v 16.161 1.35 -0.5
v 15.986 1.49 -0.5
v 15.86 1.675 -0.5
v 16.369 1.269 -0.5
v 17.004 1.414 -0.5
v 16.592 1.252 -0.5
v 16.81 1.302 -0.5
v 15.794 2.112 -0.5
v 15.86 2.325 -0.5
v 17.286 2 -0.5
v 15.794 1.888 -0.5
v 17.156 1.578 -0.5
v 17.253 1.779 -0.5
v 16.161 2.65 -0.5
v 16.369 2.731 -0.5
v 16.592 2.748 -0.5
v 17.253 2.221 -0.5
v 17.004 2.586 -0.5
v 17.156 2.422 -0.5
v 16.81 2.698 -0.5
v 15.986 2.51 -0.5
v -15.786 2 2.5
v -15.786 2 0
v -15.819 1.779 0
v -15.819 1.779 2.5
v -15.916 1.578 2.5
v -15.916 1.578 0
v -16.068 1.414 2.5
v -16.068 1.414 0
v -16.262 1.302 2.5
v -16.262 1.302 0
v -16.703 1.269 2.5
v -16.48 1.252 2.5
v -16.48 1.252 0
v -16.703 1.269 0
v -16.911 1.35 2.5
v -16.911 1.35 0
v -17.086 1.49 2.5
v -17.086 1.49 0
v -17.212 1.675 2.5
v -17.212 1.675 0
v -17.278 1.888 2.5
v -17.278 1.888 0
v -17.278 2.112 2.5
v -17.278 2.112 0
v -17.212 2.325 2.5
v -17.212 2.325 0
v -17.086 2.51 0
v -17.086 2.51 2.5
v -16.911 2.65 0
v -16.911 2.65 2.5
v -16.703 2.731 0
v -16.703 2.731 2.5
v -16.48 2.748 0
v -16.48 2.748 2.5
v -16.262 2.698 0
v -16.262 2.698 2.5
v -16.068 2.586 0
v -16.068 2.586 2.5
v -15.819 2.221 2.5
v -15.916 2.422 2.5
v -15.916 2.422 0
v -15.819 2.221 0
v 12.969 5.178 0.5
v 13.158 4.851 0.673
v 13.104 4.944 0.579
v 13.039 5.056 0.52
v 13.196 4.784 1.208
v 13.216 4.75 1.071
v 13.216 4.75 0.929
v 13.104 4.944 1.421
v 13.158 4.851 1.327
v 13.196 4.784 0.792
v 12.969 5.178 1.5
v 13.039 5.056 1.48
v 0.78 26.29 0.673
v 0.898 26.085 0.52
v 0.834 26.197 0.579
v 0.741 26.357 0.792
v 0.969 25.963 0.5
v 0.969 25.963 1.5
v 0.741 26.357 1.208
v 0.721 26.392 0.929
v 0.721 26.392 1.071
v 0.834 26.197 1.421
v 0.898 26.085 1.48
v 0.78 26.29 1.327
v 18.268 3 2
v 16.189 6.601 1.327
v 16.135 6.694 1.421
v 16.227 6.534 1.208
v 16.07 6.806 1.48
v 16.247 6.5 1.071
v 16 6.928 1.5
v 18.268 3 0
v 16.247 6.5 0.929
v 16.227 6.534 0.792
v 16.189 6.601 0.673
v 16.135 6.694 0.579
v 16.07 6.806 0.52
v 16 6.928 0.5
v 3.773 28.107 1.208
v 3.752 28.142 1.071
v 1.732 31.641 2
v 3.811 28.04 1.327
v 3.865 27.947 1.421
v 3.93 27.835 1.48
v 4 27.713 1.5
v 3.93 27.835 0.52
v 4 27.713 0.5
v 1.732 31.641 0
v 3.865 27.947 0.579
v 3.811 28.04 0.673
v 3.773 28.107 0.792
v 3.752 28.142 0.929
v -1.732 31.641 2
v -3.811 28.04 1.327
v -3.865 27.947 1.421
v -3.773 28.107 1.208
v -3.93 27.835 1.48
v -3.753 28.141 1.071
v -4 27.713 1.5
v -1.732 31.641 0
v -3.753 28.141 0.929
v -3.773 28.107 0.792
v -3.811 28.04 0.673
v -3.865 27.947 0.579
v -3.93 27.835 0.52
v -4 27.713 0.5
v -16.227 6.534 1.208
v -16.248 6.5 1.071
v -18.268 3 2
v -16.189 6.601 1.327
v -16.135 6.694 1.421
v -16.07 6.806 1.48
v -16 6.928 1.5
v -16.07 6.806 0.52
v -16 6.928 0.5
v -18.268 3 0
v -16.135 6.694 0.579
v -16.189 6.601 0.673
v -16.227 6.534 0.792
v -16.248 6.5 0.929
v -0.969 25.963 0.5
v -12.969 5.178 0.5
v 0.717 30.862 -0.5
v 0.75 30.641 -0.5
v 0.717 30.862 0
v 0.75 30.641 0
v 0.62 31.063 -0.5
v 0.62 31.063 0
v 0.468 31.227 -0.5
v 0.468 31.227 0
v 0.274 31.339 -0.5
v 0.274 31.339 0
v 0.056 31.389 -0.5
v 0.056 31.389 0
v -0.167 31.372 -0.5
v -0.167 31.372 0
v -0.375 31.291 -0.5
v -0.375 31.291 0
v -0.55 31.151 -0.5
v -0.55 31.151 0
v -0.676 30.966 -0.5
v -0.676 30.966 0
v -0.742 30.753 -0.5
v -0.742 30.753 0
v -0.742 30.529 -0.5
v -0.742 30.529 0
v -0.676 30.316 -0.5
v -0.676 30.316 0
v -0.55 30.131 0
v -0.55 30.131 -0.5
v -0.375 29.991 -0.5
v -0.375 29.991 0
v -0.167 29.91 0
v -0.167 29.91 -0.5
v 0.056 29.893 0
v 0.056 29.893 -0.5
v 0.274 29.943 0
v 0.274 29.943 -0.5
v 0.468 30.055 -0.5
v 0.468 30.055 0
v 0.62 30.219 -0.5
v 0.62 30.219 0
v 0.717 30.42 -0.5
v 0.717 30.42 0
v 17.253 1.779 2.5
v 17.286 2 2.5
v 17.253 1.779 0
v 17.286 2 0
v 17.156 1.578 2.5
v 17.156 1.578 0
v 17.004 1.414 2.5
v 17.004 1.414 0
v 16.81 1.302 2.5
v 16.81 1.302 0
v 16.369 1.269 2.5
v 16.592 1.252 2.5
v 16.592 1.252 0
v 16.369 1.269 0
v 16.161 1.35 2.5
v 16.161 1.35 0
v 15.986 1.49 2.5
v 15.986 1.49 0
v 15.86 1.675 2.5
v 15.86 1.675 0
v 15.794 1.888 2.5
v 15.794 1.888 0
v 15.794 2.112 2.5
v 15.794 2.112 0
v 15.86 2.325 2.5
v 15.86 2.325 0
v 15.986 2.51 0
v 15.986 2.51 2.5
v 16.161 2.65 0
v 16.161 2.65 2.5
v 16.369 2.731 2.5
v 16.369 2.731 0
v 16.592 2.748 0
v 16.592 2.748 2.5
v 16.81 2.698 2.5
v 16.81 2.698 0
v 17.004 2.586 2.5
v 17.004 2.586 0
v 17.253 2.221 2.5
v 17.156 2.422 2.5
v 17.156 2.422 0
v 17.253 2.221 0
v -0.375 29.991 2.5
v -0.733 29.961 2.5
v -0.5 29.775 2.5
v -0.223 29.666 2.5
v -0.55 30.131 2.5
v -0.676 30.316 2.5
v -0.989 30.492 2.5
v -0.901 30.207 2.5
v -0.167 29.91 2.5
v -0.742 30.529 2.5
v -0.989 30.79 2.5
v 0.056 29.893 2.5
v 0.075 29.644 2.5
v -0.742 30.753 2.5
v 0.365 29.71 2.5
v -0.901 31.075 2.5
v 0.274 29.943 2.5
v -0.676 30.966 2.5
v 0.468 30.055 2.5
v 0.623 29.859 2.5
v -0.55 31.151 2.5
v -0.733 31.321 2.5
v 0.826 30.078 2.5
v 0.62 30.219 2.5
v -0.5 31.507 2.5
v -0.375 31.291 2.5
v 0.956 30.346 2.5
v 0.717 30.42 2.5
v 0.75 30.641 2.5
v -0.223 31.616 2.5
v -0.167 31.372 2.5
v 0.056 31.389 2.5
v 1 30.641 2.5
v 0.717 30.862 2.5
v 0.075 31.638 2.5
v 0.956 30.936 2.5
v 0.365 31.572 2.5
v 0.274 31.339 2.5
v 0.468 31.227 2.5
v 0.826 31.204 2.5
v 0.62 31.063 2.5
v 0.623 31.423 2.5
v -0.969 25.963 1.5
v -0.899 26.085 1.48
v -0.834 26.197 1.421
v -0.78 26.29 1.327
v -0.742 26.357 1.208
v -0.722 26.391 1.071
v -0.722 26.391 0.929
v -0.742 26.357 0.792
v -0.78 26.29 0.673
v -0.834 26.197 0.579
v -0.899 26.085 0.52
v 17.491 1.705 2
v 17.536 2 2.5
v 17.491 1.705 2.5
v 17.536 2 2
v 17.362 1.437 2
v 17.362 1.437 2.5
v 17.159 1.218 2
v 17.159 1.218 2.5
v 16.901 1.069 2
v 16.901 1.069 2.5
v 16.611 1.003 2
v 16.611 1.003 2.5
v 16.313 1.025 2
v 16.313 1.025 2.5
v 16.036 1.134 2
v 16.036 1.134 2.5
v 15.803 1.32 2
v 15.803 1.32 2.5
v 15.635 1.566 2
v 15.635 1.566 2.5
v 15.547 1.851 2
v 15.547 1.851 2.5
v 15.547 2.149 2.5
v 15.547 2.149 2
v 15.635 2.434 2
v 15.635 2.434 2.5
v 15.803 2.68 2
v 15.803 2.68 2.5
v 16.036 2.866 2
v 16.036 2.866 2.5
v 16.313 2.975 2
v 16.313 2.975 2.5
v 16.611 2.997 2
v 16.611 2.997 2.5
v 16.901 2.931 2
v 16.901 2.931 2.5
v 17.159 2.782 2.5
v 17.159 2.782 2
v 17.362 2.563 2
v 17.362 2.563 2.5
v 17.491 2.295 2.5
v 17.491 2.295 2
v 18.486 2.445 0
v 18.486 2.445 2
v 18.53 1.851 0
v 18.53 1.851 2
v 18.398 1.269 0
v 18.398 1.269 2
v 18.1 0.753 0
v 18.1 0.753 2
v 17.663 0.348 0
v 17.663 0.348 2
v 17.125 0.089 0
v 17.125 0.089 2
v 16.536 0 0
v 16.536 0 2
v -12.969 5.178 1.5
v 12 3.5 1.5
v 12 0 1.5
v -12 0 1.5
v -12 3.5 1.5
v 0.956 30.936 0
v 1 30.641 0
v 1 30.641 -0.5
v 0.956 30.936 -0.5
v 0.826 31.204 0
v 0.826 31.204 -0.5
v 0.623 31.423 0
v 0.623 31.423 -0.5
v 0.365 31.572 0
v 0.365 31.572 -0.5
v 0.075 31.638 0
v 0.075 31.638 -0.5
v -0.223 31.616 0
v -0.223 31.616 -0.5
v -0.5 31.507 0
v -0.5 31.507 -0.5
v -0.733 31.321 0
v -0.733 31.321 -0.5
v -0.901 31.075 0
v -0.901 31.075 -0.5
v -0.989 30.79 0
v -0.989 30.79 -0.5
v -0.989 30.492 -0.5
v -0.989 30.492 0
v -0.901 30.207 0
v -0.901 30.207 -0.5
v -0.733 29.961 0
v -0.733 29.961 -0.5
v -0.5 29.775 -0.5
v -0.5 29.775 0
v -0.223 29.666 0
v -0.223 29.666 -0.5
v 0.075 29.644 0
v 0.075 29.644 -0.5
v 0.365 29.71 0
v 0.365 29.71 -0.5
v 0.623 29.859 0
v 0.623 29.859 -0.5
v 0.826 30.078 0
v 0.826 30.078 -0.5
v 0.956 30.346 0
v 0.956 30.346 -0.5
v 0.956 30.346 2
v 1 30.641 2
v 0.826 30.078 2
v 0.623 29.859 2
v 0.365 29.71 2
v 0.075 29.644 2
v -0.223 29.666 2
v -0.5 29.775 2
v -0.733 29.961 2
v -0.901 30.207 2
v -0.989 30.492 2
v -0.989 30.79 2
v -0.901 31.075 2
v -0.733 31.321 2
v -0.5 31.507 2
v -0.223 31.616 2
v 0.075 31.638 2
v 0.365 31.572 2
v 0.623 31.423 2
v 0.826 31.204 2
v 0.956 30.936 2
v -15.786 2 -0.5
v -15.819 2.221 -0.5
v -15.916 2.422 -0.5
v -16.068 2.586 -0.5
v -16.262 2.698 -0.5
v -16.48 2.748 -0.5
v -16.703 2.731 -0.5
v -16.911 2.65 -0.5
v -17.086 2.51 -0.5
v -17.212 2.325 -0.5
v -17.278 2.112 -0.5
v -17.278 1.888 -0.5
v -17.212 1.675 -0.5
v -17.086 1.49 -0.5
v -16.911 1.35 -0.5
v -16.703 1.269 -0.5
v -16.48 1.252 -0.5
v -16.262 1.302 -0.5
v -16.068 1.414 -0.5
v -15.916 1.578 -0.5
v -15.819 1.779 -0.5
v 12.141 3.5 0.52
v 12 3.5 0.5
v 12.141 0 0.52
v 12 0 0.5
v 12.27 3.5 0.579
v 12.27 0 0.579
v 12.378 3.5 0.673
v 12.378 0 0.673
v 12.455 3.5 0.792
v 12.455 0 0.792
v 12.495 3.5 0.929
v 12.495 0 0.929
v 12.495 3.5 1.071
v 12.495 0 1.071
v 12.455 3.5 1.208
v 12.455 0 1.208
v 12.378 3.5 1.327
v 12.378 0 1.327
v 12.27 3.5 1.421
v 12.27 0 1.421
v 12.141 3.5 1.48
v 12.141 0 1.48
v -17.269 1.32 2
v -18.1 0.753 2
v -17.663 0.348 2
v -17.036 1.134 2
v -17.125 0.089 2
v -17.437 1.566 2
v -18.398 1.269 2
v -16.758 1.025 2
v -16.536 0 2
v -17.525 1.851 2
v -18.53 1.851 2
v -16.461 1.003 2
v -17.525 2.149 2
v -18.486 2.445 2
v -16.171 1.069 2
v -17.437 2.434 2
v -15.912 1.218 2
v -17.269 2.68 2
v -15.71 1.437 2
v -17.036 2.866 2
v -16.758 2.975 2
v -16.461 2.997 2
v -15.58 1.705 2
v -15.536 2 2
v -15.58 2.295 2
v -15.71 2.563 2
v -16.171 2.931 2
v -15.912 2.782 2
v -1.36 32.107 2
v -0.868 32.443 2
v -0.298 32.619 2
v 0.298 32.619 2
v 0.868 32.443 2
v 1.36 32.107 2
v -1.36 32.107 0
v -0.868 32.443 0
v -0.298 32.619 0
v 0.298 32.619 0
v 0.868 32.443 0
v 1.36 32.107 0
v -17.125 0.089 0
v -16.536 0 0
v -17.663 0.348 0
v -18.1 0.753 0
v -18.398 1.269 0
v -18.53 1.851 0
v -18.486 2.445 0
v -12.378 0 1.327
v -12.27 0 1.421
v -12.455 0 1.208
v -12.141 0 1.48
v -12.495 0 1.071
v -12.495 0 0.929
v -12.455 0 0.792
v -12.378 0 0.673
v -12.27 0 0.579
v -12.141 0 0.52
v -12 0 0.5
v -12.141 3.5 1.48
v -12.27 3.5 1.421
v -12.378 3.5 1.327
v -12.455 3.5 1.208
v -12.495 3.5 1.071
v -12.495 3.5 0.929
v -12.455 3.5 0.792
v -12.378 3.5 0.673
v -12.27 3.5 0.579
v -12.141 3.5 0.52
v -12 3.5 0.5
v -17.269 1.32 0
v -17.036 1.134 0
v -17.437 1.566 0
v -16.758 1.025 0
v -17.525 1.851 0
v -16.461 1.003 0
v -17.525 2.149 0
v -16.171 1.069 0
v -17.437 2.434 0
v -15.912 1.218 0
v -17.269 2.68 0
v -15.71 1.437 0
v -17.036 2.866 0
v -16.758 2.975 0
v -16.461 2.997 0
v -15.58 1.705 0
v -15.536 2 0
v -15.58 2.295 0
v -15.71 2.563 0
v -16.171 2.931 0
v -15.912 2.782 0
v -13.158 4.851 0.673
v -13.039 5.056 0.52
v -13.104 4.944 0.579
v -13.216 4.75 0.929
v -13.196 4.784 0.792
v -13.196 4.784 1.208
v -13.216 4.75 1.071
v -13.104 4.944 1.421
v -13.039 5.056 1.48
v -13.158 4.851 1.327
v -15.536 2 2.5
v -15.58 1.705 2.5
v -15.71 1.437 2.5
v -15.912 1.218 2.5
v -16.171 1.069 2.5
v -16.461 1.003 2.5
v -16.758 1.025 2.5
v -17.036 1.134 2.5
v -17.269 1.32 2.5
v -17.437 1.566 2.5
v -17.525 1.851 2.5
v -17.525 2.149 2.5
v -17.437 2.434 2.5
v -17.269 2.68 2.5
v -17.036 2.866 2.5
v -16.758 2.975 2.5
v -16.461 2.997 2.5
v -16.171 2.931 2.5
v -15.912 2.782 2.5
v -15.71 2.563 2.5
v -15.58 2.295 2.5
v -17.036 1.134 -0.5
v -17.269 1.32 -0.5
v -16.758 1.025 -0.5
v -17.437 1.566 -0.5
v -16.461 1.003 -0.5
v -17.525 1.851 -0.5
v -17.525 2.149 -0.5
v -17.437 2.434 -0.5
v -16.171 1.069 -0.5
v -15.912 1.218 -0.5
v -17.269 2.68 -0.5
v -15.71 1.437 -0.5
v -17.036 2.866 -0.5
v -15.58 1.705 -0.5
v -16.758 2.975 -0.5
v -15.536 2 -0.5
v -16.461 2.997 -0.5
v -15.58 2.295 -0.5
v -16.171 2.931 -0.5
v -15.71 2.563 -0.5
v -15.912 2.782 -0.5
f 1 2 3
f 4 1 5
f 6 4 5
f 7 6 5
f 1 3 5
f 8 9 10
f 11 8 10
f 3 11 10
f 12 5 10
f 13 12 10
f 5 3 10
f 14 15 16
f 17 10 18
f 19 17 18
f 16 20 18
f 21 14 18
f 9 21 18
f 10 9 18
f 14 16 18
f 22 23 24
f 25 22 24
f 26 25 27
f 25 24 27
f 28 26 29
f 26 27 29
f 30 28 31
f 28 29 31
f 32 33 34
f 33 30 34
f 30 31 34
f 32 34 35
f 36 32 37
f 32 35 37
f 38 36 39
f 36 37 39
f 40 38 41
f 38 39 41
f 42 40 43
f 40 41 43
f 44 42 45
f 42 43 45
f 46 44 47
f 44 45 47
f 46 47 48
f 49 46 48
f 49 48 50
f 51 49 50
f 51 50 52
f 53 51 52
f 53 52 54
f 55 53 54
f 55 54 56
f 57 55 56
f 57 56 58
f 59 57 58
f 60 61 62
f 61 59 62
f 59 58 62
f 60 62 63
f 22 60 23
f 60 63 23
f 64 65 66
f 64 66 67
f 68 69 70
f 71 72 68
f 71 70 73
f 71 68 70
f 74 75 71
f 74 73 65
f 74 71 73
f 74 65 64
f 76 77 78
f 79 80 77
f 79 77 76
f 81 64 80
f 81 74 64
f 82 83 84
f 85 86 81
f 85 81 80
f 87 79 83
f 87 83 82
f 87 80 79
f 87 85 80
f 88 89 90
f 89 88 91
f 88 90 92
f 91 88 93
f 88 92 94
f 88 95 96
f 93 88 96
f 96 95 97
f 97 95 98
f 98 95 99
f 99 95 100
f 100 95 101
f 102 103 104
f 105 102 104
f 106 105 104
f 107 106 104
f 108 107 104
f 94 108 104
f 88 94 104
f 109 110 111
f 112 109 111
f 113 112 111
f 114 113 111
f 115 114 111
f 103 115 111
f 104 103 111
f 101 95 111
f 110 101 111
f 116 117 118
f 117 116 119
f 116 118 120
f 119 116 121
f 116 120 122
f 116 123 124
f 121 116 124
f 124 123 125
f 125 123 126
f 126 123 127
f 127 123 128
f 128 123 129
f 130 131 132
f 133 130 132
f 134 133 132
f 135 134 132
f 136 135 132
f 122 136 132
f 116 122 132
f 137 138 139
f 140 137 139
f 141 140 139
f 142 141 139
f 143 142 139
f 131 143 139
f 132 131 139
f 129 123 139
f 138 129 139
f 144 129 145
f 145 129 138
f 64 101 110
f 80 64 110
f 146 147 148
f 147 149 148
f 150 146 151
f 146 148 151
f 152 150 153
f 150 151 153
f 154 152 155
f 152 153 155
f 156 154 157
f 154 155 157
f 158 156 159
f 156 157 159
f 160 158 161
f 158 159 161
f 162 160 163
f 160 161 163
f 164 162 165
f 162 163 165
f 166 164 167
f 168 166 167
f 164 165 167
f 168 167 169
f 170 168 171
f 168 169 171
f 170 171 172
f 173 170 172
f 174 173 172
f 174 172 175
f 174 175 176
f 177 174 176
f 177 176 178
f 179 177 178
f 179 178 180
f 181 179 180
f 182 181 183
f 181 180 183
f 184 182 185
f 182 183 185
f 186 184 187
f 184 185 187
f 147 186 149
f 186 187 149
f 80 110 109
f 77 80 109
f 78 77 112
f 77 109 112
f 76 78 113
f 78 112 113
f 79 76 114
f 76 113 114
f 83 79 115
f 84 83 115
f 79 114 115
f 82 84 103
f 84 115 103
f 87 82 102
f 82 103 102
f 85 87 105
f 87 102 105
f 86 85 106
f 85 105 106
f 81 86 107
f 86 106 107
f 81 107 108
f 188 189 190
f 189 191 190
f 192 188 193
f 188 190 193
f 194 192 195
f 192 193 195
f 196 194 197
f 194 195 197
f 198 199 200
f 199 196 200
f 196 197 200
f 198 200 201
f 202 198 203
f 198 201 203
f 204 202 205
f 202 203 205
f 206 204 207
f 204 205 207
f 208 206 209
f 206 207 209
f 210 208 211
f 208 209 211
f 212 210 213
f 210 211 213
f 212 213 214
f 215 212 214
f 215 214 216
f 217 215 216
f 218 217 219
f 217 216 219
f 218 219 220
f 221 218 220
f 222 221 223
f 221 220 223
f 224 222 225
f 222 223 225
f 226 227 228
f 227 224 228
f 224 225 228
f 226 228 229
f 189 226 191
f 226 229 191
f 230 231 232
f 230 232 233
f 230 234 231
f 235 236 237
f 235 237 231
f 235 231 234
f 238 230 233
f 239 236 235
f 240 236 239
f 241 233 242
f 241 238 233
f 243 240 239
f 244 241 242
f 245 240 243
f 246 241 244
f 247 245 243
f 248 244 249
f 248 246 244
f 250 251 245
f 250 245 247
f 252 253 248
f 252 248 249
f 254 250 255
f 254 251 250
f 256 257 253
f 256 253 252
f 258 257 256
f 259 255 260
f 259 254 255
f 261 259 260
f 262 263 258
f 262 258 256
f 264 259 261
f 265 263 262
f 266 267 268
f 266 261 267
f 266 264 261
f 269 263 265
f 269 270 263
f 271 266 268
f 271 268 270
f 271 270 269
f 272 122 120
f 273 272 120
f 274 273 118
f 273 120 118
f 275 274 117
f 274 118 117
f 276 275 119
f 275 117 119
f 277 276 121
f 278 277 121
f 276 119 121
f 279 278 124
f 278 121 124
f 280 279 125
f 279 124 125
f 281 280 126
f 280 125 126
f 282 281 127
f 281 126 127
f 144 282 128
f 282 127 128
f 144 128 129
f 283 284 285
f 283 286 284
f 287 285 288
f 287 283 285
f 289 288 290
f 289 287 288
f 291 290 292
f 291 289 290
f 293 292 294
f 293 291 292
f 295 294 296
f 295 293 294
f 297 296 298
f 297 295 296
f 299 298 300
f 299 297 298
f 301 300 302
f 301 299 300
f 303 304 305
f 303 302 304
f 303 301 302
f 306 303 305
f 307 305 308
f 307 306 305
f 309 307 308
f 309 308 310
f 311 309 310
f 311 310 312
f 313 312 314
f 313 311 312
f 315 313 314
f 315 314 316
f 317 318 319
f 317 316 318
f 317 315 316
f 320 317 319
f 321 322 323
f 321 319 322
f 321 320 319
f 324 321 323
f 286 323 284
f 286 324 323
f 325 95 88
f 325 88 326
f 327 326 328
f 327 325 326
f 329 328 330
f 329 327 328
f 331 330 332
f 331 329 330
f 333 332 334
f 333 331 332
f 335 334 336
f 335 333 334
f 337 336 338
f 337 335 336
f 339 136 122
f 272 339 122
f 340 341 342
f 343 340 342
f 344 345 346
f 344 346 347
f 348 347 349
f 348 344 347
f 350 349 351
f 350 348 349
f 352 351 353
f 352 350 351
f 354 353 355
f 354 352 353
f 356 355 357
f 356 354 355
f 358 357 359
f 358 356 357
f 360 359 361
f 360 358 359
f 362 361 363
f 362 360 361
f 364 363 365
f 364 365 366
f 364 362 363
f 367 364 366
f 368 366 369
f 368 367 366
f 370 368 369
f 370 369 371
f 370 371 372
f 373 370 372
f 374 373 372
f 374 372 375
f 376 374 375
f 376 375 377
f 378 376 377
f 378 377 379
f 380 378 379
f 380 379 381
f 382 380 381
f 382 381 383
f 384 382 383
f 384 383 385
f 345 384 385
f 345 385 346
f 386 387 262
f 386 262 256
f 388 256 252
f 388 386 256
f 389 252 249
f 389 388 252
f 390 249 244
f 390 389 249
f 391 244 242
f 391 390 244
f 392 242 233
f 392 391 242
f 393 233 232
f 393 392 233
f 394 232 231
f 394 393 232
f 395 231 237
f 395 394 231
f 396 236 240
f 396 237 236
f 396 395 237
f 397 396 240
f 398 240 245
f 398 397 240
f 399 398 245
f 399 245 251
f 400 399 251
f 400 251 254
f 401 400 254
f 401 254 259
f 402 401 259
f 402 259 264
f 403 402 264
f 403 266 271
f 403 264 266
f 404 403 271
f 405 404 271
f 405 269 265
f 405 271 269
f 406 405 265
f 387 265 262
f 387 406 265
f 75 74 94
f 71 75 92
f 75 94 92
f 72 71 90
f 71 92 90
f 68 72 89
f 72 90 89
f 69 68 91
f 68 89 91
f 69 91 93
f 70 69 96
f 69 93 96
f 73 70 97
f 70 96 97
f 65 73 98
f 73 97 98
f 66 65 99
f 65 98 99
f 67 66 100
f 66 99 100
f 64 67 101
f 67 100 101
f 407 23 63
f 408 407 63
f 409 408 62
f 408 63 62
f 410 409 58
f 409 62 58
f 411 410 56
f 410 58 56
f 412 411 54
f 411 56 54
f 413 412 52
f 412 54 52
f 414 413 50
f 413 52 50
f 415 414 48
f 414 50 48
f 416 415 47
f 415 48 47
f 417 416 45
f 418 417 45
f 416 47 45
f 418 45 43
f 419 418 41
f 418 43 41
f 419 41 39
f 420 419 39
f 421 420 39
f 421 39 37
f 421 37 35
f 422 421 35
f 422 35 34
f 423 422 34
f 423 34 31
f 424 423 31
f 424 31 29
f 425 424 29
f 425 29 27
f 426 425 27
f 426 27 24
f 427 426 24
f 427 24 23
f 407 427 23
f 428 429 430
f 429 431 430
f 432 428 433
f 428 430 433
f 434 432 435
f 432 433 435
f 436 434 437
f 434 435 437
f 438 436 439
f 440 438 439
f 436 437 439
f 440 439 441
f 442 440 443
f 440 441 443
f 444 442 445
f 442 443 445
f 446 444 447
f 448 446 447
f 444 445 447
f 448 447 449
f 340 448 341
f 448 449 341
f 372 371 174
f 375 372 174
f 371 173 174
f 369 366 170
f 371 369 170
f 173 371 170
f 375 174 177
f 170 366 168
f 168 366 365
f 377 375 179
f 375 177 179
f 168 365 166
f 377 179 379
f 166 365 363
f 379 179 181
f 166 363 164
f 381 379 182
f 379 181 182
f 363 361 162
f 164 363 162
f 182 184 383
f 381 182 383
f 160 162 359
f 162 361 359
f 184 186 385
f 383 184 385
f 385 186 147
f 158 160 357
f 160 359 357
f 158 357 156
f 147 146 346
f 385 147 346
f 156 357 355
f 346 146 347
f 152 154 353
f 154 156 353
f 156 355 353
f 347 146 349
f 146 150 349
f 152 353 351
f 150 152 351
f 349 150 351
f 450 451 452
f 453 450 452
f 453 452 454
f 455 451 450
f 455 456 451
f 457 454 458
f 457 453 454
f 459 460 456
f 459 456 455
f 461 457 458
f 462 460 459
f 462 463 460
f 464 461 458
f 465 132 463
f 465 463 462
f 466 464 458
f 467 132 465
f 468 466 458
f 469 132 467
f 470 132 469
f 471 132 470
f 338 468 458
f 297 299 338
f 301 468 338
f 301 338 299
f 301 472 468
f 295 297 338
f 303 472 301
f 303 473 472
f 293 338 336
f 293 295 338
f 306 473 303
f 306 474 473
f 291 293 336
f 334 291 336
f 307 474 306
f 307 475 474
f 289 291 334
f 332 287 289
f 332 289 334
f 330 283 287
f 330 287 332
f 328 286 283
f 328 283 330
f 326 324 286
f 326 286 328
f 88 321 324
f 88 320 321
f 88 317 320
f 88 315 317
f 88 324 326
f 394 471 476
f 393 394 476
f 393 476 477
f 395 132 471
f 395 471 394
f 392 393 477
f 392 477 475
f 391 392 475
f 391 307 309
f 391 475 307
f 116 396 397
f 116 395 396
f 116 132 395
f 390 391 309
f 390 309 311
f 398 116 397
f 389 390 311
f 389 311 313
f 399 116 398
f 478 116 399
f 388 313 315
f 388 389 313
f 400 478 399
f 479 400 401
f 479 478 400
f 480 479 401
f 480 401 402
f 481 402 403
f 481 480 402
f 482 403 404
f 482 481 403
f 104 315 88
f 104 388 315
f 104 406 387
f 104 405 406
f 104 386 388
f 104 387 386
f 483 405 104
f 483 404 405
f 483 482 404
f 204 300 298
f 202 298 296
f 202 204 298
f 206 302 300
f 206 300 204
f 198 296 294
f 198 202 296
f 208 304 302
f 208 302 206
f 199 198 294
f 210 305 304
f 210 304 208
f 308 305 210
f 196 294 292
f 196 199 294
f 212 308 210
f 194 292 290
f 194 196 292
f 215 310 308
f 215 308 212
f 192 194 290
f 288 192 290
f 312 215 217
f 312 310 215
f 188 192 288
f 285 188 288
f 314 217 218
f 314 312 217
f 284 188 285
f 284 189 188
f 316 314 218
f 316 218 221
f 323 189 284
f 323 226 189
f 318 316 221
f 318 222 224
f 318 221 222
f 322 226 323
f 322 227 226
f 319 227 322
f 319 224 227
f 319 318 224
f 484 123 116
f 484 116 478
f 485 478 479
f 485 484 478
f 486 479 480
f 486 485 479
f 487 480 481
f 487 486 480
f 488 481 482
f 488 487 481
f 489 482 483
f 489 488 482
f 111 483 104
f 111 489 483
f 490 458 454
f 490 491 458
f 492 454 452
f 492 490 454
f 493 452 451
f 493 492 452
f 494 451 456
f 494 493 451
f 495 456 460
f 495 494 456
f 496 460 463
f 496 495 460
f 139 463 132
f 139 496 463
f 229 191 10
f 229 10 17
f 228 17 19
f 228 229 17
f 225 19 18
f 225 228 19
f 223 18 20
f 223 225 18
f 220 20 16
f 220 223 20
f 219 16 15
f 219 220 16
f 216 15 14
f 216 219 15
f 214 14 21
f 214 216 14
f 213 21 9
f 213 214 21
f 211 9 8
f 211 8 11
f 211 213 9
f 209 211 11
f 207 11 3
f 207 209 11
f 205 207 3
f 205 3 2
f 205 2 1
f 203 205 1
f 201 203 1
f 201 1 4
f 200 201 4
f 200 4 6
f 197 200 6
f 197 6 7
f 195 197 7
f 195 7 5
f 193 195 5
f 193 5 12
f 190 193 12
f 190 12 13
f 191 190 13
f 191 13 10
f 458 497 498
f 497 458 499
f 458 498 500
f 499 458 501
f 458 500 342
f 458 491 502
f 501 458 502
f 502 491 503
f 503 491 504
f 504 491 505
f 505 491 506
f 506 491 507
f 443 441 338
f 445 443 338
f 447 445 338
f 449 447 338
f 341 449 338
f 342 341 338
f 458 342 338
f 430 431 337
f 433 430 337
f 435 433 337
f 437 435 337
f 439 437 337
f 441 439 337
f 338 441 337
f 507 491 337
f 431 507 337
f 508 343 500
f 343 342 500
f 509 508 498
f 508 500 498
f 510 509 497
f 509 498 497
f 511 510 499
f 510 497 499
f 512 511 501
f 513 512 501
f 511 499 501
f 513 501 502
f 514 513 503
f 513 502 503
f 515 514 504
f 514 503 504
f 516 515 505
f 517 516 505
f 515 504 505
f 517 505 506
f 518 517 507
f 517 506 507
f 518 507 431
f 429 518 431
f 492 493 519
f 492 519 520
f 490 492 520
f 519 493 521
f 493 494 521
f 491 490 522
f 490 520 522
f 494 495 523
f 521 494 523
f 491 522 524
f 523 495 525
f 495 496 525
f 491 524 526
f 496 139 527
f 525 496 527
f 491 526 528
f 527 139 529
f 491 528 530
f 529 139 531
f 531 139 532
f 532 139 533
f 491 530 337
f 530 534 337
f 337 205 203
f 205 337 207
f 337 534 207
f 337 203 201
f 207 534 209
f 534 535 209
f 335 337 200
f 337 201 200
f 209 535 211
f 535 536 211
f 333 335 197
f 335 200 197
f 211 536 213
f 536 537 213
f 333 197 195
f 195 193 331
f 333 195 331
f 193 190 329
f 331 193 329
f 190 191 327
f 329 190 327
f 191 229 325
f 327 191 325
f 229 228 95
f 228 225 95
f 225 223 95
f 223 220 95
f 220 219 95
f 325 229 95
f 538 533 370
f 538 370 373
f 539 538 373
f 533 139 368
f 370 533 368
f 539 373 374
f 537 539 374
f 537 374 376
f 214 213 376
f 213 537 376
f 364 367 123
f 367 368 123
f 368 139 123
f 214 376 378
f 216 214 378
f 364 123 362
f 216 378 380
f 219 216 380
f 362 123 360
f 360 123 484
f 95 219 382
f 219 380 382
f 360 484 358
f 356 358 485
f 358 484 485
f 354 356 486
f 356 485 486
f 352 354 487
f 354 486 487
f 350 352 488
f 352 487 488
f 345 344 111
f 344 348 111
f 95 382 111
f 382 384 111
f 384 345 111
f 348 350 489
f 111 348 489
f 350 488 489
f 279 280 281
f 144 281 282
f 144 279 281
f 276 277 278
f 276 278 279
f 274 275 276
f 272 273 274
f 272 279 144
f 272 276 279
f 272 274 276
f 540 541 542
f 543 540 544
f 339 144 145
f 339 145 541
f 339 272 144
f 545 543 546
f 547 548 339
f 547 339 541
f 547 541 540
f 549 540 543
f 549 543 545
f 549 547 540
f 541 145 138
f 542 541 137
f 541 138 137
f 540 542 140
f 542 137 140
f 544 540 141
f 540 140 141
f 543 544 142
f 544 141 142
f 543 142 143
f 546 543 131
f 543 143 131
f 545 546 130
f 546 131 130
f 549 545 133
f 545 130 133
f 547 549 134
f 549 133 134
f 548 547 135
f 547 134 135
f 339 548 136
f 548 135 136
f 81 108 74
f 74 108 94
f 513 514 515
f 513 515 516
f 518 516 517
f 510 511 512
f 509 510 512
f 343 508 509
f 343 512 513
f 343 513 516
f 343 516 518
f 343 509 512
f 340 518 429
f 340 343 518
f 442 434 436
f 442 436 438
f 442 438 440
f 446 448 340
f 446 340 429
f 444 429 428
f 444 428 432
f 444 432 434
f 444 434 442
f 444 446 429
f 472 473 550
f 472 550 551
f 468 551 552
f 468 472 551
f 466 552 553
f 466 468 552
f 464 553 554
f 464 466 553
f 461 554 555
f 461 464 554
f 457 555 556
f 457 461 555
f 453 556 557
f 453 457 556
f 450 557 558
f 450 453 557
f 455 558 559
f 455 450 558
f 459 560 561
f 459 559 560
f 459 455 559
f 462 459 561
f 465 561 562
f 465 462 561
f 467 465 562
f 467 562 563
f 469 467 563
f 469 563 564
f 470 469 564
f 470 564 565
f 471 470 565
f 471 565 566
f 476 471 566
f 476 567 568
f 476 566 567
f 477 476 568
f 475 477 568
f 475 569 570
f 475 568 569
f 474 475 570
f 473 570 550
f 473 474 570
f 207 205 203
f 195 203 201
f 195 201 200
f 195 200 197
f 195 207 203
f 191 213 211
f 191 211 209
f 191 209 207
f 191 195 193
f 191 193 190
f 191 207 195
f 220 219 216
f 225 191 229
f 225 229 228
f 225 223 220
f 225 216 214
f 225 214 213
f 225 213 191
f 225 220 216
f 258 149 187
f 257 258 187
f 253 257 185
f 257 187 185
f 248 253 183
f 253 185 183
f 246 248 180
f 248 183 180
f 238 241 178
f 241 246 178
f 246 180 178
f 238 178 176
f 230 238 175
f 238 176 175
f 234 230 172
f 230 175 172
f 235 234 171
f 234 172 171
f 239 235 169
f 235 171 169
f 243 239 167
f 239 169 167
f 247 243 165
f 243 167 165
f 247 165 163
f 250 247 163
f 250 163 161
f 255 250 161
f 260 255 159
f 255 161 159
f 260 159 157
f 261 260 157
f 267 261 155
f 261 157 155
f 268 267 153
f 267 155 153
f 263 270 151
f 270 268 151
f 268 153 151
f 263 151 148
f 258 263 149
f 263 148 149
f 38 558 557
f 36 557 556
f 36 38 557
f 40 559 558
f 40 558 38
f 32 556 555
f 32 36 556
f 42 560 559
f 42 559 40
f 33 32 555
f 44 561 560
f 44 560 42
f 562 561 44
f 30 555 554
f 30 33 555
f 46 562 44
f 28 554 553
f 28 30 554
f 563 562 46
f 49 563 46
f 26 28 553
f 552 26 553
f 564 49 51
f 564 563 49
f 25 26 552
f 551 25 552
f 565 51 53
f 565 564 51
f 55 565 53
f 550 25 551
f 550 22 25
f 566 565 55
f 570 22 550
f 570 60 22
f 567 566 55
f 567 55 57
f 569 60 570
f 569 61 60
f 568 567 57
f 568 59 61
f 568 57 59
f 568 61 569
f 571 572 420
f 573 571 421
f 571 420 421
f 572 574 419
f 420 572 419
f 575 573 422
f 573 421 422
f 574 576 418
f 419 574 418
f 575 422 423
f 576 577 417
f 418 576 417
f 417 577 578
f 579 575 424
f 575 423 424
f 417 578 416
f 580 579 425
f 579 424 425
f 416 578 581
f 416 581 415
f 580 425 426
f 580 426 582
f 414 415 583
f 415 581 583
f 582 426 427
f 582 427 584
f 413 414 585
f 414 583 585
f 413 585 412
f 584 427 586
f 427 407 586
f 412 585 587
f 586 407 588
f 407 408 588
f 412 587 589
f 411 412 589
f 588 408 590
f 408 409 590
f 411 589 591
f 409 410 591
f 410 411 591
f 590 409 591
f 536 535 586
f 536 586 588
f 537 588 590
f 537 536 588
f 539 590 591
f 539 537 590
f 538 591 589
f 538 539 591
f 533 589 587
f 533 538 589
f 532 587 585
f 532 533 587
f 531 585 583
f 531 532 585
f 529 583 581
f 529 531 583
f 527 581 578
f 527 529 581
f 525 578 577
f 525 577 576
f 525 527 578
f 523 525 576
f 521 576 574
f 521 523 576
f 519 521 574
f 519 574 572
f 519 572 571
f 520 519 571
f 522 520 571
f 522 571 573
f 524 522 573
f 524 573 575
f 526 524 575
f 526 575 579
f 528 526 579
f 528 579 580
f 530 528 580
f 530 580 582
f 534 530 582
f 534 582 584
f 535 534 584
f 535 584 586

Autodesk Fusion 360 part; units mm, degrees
sketch "Sketch1" plane through (0, 0, 0) normal (0, 0, 1) x (1, 0, 0)
  line L0 (-16.5359, 0) -> (16.5359, 0)
  line L1 (18.2679, 3) -> (1.7321, 31.641)
  line L2 (-1.7321, 31.641) -> (-18.2679, 3)
  arc A0 (1.7321, 31.641) -> (-1.7321, 31.641) centre (0, 30.641) ccw
  arc A1 (-18.2679, 3) -> (-16.5359, 0) centre (-16.5359, 2) ccw
  arc A2 (16.5359, 0) -> (18.2679, 3) centre (16.5359, 2) ccw
  line L3 (0, 30.641) -> (0, -11) construction
  line L4 (-16.5359, 2) -> (23.2309, 24.9594) construction
  circle A3 centre (0, 30.641) radius 1
  circle A4 centre (0, 30.641) radius 0.75
  circle A5 centre (-16.5359, 2) radius 0.75
  circle A6 centre (-16.5359, 2) radius 1
  circle A7 centre (16.5359, 2) radius 0.75
  circle A8 centre (16.5359, 2) radius 1
  point P0 (0, 11.547)
  dimension "d4" = 2
  dimension "d5" = 2
  dimension "d6" = 2
  dimension "d10" = 2
  dimension "d11" = 1.5
  dimension "d13" = 360
extrude "Extrude1" add sketch "Sketch1" along normal blind 2 contours L0 L1 L2 A0 A1 A2 makes body 1
sketch "Sketch2" plane through (0, 0, 0) normal (0, -1, 0) x (1, 0, 0)
  line L0 (-16.5359, 0) -> (16.5359, 0)
  line L1 (16.5359, 0) -> (16.5359, 2)
  line L2 (16.5359, 2) -> (-16.5359, 2)
  line L3 (-16.5359, 2) -> (-16.5359, 0)
  line L4 (-12, 0.5) -> (12, 0.5)
  arc A0 (12, 0.5) -> (12, 1.5) centre (12, 1) ccw
  line L5 (12, 1.5) -> (-12, 1.5)
  arc A1 (-12, 1.5) -> (-12, 0.5) centre (-12, 1) ccw
  line L6 (-12, 1) -> (12, 1) construction
  dimension "d17" = 1
sketch "Sketch3" plane through (15, 8.6603, 0) normal (0.866, 0.5, 0) x (-0.5, 0.866, 0)
  line L0 (-6.5359, 0) -> (26.5359, 0)
  line L1 (26.5359, 0) -> (26.5359, 2)
  line L2 (26.5359, 2) -> (-6.5359, 2)
  line L3 (-6.5359, 2) -> (-6.5359, 0)
  line L4 (-1.9999, 0.5) -> (22.0001, 0.5)
  arc A0 (22.0001, 0.5) -> (22.0001, 1.5) centre (22.0001, 1) ccw
  line L5 (22.0001, 1.5) -> (-1.9999, 1.5)
  arc A1 (-1.9999, 1.5) -> (-1.9999, 0.5) centre (-1.9999, 1) ccw
  line L6 (-1.9999, 1) -> (22.0001, 1) construction
  point P0 (10.0001, 1)
  dimension "d20" = 1
sketch "Sketch4" plane through (-15, 8.6603, 0) normal (-0.866, 0.5, 0) x (-0.5, -0.866, 0)
  line L0 (-26.5359, 0) -> (6.5359, 0)
  line L1 (6.5359, 0) -> (6.5359, 2)
  line L2 (6.5359, 2) -> (-26.5359, 2)
  line L3 (-26.5359, 2) -> (-26.5359, 0)
  line L4 (-21.9999, 0.5) -> (2.0001, 0.5)
  arc A0 (2.0001, 0.5) -> (2.0001, 1.5) centre (2.0001, 1) ccw
  line L5 (2.0001, 1.5) -> (-21.9999, 1.5)
  arc A1 (-21.9999, 1.5) -> (-21.9999, 0.5) centre (-21.9999, 1) ccw
  line L6 (-21.9999, 1) -> (2.0001, 1) construction
  point P0 (-9.9999, 1)
  dimension "d23" = 1
extrude "Extrude2" add sketch "Sketch1" along normal blind 2.5 contours A8 bodies 1
extrude "Extrude3" add sketch "Sketch1" along normal blind 2.5 contours A3 bodies 1
extrude "Extrude4" add sketch "Sketch1" along normal blind 2.5 contours A6 bodies 1
extrude "Extrude5" cut sketch "Sketch3" against normal blind 3.5 contours L4 A0 L5 A1 bodies 1
extrude "Extrude6" cut sketch "Sketch4" against normal blind 3.5 contours L4 A0 L5 A1 bodies 1
extrude "Extrude7" cut sketch "Sketch2" against normal blind 3.5 contours L4 A0 L5 A1 bodies 1
extrude "Extrude8" add sketch "Sketch1" against normal blind 0.5 separate body contours A7 makes body 2
extrude "Extrude9" add sketch "Sketch1" against normal blind 0.5 contours A6 bodies 1
extrude "Extrude10" add sketch "Sketch1" against normal blind 0.5 contours A3 bodies 1
